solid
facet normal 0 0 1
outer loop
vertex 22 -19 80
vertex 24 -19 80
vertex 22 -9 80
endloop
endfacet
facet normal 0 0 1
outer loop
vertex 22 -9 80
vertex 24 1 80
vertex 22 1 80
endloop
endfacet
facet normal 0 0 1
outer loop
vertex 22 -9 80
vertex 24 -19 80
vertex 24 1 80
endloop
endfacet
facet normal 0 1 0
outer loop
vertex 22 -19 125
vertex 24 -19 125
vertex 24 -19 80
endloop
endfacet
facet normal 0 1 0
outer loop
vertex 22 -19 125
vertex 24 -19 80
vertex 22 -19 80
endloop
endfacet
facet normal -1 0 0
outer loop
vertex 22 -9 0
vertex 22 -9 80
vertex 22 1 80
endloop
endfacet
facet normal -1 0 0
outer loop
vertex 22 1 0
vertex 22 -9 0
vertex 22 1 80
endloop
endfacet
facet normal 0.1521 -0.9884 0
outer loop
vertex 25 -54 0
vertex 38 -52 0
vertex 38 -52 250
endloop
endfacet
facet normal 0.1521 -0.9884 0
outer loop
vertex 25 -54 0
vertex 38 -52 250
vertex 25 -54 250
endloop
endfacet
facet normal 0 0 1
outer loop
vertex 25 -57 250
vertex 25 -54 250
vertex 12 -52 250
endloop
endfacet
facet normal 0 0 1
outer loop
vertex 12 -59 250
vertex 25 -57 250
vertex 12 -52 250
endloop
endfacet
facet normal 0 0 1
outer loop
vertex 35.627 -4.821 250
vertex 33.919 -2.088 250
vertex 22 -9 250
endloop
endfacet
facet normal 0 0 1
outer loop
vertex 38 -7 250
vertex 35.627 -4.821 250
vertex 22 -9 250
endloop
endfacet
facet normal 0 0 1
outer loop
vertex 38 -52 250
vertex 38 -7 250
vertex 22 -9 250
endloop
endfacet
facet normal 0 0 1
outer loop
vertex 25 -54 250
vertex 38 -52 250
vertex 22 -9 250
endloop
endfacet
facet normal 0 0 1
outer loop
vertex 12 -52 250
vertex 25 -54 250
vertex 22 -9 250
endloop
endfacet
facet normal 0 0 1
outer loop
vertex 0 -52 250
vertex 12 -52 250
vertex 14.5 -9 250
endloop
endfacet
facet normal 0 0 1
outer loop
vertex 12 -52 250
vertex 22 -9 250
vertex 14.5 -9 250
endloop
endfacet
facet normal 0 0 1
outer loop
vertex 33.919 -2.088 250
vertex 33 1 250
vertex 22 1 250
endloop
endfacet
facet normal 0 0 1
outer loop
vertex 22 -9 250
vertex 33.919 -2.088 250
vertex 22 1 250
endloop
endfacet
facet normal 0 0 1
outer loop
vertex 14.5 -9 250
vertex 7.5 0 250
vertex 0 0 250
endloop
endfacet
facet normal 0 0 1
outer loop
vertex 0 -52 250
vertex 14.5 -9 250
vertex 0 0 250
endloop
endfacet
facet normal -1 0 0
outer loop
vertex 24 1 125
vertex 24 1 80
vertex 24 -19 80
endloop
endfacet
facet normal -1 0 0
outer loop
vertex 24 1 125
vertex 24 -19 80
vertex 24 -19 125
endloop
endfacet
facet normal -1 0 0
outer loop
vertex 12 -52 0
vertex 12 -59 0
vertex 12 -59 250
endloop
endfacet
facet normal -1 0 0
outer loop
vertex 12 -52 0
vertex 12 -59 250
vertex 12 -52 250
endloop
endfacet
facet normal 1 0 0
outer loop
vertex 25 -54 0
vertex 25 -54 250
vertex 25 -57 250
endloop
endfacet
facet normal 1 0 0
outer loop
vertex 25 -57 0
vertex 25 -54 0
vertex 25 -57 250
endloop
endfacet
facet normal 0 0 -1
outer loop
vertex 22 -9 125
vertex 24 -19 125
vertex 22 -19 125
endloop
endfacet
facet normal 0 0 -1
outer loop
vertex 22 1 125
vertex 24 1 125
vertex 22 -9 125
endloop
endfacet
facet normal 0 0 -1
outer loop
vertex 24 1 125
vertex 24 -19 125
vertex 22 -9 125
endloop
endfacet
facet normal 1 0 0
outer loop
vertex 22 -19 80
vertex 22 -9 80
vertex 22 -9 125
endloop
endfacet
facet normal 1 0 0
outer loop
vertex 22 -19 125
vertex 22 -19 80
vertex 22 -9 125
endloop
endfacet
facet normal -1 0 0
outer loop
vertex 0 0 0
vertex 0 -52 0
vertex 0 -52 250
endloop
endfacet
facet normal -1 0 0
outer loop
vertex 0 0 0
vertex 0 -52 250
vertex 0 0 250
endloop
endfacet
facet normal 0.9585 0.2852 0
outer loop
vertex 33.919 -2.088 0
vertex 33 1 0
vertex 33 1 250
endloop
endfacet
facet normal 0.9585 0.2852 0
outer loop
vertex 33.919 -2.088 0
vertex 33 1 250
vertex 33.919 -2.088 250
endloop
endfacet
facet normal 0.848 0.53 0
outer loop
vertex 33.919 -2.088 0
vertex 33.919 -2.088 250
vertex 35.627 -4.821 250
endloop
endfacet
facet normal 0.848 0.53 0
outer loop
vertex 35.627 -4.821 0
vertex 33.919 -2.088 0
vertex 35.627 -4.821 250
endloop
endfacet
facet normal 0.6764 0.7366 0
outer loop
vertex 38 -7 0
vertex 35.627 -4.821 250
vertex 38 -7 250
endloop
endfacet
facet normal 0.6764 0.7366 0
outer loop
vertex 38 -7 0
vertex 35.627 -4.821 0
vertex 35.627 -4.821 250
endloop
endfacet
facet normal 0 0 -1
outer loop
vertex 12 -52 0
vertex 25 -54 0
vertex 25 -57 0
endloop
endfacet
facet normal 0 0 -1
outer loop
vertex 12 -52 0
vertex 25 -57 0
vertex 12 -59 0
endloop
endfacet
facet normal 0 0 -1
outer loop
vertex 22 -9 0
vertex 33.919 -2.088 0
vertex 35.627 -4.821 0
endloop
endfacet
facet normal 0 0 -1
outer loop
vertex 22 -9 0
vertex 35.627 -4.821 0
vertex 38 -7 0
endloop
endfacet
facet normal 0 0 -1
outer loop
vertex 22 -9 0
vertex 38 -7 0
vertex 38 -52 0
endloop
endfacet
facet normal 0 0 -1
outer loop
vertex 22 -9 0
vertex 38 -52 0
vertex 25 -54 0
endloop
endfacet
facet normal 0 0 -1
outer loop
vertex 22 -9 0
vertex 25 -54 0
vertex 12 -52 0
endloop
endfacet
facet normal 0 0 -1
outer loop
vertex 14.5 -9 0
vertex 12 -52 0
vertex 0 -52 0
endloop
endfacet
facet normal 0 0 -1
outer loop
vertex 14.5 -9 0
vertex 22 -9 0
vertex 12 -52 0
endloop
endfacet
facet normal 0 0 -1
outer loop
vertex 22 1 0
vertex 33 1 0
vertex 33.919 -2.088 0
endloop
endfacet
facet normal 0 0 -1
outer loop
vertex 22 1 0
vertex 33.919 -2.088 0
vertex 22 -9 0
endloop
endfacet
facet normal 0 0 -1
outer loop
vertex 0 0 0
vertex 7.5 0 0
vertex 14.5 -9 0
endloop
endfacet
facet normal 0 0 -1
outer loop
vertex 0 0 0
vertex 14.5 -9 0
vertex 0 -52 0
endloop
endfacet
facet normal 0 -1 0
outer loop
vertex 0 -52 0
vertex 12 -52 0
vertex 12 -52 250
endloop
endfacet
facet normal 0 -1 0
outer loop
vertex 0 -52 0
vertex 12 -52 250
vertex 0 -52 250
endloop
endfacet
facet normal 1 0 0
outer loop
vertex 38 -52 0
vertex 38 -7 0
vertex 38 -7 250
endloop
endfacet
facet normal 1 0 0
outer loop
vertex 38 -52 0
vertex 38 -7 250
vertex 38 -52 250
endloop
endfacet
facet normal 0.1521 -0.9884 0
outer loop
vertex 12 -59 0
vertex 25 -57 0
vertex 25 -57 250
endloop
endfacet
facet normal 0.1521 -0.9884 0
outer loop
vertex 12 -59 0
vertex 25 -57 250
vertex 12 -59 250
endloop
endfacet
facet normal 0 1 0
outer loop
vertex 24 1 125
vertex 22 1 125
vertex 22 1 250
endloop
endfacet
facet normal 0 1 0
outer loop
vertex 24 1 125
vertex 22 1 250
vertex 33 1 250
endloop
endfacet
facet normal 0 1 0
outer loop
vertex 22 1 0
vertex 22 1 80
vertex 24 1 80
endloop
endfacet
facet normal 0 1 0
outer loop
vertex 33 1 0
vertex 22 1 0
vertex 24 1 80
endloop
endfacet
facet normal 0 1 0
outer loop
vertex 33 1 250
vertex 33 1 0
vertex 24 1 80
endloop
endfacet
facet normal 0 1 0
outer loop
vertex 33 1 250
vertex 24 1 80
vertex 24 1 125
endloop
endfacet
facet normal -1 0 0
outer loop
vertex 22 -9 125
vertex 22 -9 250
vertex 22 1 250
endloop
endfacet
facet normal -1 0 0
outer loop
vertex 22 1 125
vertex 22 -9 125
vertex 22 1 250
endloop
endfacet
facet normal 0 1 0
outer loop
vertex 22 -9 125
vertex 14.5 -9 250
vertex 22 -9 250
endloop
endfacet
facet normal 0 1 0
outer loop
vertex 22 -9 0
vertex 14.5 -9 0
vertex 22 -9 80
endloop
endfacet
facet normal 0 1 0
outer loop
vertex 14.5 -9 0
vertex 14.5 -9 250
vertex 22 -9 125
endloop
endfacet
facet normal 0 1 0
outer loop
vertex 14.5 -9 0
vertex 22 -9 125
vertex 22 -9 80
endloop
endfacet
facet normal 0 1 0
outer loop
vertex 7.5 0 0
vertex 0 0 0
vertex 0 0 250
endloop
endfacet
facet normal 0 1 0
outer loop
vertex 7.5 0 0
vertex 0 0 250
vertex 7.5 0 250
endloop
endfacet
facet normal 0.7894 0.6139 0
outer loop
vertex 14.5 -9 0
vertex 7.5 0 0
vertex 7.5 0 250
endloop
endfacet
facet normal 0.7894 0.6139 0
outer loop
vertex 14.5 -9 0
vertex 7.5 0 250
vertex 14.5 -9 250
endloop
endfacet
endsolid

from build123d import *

# Parameters (mm, degrees)
PAD_DEPTH    = 250
SKETCH001_W  = 2
SKETCH001_H  = 45
POCKET_DEPTH = 20


with BuildPart() as part:
    # Sketch → Pad (new body)
    with BuildSketch(Plane.XY):
        with BuildLine():
            Line((0, 0), (7.5, 0))
            Line((7.5, 0), (14.5, -9))
            Line((14.5, -9), (22, -9))
            Line((22, -9), (22, 1))
            Line((22, 1), (33, 1))
            ThreePointArc((33, 1), (34.680866, -3.511959), (38, -7))
            Line((38, -7), (38, -52))
            Line((38, -52), (25, -54))
            Line((25, -54), (25, -57))
            Line((25, -57), (12, -59))
            Line((12, -59), (12, -52))
            Line((12, -52), (0, -52))
            Line((0, -52), (0, 0))
        make_face()
    extrude(amount=PAD_DEPTH)

    # Sketch001 (on Face5 of Pad) → Pocket (cut)
    with BuildSketch(Plane(origin=(0, 1, 0), x_dir=(-1, 0, 0), z_dir=(0, 1, 0))):
        with Locations((-23, 102.5)):
            Rectangle(SKETCH001_W, SKETCH001_H)
    extrude(amount=-POCKET_DEPTH, mode=Mode.SUBTRACT)


solid = part.part
